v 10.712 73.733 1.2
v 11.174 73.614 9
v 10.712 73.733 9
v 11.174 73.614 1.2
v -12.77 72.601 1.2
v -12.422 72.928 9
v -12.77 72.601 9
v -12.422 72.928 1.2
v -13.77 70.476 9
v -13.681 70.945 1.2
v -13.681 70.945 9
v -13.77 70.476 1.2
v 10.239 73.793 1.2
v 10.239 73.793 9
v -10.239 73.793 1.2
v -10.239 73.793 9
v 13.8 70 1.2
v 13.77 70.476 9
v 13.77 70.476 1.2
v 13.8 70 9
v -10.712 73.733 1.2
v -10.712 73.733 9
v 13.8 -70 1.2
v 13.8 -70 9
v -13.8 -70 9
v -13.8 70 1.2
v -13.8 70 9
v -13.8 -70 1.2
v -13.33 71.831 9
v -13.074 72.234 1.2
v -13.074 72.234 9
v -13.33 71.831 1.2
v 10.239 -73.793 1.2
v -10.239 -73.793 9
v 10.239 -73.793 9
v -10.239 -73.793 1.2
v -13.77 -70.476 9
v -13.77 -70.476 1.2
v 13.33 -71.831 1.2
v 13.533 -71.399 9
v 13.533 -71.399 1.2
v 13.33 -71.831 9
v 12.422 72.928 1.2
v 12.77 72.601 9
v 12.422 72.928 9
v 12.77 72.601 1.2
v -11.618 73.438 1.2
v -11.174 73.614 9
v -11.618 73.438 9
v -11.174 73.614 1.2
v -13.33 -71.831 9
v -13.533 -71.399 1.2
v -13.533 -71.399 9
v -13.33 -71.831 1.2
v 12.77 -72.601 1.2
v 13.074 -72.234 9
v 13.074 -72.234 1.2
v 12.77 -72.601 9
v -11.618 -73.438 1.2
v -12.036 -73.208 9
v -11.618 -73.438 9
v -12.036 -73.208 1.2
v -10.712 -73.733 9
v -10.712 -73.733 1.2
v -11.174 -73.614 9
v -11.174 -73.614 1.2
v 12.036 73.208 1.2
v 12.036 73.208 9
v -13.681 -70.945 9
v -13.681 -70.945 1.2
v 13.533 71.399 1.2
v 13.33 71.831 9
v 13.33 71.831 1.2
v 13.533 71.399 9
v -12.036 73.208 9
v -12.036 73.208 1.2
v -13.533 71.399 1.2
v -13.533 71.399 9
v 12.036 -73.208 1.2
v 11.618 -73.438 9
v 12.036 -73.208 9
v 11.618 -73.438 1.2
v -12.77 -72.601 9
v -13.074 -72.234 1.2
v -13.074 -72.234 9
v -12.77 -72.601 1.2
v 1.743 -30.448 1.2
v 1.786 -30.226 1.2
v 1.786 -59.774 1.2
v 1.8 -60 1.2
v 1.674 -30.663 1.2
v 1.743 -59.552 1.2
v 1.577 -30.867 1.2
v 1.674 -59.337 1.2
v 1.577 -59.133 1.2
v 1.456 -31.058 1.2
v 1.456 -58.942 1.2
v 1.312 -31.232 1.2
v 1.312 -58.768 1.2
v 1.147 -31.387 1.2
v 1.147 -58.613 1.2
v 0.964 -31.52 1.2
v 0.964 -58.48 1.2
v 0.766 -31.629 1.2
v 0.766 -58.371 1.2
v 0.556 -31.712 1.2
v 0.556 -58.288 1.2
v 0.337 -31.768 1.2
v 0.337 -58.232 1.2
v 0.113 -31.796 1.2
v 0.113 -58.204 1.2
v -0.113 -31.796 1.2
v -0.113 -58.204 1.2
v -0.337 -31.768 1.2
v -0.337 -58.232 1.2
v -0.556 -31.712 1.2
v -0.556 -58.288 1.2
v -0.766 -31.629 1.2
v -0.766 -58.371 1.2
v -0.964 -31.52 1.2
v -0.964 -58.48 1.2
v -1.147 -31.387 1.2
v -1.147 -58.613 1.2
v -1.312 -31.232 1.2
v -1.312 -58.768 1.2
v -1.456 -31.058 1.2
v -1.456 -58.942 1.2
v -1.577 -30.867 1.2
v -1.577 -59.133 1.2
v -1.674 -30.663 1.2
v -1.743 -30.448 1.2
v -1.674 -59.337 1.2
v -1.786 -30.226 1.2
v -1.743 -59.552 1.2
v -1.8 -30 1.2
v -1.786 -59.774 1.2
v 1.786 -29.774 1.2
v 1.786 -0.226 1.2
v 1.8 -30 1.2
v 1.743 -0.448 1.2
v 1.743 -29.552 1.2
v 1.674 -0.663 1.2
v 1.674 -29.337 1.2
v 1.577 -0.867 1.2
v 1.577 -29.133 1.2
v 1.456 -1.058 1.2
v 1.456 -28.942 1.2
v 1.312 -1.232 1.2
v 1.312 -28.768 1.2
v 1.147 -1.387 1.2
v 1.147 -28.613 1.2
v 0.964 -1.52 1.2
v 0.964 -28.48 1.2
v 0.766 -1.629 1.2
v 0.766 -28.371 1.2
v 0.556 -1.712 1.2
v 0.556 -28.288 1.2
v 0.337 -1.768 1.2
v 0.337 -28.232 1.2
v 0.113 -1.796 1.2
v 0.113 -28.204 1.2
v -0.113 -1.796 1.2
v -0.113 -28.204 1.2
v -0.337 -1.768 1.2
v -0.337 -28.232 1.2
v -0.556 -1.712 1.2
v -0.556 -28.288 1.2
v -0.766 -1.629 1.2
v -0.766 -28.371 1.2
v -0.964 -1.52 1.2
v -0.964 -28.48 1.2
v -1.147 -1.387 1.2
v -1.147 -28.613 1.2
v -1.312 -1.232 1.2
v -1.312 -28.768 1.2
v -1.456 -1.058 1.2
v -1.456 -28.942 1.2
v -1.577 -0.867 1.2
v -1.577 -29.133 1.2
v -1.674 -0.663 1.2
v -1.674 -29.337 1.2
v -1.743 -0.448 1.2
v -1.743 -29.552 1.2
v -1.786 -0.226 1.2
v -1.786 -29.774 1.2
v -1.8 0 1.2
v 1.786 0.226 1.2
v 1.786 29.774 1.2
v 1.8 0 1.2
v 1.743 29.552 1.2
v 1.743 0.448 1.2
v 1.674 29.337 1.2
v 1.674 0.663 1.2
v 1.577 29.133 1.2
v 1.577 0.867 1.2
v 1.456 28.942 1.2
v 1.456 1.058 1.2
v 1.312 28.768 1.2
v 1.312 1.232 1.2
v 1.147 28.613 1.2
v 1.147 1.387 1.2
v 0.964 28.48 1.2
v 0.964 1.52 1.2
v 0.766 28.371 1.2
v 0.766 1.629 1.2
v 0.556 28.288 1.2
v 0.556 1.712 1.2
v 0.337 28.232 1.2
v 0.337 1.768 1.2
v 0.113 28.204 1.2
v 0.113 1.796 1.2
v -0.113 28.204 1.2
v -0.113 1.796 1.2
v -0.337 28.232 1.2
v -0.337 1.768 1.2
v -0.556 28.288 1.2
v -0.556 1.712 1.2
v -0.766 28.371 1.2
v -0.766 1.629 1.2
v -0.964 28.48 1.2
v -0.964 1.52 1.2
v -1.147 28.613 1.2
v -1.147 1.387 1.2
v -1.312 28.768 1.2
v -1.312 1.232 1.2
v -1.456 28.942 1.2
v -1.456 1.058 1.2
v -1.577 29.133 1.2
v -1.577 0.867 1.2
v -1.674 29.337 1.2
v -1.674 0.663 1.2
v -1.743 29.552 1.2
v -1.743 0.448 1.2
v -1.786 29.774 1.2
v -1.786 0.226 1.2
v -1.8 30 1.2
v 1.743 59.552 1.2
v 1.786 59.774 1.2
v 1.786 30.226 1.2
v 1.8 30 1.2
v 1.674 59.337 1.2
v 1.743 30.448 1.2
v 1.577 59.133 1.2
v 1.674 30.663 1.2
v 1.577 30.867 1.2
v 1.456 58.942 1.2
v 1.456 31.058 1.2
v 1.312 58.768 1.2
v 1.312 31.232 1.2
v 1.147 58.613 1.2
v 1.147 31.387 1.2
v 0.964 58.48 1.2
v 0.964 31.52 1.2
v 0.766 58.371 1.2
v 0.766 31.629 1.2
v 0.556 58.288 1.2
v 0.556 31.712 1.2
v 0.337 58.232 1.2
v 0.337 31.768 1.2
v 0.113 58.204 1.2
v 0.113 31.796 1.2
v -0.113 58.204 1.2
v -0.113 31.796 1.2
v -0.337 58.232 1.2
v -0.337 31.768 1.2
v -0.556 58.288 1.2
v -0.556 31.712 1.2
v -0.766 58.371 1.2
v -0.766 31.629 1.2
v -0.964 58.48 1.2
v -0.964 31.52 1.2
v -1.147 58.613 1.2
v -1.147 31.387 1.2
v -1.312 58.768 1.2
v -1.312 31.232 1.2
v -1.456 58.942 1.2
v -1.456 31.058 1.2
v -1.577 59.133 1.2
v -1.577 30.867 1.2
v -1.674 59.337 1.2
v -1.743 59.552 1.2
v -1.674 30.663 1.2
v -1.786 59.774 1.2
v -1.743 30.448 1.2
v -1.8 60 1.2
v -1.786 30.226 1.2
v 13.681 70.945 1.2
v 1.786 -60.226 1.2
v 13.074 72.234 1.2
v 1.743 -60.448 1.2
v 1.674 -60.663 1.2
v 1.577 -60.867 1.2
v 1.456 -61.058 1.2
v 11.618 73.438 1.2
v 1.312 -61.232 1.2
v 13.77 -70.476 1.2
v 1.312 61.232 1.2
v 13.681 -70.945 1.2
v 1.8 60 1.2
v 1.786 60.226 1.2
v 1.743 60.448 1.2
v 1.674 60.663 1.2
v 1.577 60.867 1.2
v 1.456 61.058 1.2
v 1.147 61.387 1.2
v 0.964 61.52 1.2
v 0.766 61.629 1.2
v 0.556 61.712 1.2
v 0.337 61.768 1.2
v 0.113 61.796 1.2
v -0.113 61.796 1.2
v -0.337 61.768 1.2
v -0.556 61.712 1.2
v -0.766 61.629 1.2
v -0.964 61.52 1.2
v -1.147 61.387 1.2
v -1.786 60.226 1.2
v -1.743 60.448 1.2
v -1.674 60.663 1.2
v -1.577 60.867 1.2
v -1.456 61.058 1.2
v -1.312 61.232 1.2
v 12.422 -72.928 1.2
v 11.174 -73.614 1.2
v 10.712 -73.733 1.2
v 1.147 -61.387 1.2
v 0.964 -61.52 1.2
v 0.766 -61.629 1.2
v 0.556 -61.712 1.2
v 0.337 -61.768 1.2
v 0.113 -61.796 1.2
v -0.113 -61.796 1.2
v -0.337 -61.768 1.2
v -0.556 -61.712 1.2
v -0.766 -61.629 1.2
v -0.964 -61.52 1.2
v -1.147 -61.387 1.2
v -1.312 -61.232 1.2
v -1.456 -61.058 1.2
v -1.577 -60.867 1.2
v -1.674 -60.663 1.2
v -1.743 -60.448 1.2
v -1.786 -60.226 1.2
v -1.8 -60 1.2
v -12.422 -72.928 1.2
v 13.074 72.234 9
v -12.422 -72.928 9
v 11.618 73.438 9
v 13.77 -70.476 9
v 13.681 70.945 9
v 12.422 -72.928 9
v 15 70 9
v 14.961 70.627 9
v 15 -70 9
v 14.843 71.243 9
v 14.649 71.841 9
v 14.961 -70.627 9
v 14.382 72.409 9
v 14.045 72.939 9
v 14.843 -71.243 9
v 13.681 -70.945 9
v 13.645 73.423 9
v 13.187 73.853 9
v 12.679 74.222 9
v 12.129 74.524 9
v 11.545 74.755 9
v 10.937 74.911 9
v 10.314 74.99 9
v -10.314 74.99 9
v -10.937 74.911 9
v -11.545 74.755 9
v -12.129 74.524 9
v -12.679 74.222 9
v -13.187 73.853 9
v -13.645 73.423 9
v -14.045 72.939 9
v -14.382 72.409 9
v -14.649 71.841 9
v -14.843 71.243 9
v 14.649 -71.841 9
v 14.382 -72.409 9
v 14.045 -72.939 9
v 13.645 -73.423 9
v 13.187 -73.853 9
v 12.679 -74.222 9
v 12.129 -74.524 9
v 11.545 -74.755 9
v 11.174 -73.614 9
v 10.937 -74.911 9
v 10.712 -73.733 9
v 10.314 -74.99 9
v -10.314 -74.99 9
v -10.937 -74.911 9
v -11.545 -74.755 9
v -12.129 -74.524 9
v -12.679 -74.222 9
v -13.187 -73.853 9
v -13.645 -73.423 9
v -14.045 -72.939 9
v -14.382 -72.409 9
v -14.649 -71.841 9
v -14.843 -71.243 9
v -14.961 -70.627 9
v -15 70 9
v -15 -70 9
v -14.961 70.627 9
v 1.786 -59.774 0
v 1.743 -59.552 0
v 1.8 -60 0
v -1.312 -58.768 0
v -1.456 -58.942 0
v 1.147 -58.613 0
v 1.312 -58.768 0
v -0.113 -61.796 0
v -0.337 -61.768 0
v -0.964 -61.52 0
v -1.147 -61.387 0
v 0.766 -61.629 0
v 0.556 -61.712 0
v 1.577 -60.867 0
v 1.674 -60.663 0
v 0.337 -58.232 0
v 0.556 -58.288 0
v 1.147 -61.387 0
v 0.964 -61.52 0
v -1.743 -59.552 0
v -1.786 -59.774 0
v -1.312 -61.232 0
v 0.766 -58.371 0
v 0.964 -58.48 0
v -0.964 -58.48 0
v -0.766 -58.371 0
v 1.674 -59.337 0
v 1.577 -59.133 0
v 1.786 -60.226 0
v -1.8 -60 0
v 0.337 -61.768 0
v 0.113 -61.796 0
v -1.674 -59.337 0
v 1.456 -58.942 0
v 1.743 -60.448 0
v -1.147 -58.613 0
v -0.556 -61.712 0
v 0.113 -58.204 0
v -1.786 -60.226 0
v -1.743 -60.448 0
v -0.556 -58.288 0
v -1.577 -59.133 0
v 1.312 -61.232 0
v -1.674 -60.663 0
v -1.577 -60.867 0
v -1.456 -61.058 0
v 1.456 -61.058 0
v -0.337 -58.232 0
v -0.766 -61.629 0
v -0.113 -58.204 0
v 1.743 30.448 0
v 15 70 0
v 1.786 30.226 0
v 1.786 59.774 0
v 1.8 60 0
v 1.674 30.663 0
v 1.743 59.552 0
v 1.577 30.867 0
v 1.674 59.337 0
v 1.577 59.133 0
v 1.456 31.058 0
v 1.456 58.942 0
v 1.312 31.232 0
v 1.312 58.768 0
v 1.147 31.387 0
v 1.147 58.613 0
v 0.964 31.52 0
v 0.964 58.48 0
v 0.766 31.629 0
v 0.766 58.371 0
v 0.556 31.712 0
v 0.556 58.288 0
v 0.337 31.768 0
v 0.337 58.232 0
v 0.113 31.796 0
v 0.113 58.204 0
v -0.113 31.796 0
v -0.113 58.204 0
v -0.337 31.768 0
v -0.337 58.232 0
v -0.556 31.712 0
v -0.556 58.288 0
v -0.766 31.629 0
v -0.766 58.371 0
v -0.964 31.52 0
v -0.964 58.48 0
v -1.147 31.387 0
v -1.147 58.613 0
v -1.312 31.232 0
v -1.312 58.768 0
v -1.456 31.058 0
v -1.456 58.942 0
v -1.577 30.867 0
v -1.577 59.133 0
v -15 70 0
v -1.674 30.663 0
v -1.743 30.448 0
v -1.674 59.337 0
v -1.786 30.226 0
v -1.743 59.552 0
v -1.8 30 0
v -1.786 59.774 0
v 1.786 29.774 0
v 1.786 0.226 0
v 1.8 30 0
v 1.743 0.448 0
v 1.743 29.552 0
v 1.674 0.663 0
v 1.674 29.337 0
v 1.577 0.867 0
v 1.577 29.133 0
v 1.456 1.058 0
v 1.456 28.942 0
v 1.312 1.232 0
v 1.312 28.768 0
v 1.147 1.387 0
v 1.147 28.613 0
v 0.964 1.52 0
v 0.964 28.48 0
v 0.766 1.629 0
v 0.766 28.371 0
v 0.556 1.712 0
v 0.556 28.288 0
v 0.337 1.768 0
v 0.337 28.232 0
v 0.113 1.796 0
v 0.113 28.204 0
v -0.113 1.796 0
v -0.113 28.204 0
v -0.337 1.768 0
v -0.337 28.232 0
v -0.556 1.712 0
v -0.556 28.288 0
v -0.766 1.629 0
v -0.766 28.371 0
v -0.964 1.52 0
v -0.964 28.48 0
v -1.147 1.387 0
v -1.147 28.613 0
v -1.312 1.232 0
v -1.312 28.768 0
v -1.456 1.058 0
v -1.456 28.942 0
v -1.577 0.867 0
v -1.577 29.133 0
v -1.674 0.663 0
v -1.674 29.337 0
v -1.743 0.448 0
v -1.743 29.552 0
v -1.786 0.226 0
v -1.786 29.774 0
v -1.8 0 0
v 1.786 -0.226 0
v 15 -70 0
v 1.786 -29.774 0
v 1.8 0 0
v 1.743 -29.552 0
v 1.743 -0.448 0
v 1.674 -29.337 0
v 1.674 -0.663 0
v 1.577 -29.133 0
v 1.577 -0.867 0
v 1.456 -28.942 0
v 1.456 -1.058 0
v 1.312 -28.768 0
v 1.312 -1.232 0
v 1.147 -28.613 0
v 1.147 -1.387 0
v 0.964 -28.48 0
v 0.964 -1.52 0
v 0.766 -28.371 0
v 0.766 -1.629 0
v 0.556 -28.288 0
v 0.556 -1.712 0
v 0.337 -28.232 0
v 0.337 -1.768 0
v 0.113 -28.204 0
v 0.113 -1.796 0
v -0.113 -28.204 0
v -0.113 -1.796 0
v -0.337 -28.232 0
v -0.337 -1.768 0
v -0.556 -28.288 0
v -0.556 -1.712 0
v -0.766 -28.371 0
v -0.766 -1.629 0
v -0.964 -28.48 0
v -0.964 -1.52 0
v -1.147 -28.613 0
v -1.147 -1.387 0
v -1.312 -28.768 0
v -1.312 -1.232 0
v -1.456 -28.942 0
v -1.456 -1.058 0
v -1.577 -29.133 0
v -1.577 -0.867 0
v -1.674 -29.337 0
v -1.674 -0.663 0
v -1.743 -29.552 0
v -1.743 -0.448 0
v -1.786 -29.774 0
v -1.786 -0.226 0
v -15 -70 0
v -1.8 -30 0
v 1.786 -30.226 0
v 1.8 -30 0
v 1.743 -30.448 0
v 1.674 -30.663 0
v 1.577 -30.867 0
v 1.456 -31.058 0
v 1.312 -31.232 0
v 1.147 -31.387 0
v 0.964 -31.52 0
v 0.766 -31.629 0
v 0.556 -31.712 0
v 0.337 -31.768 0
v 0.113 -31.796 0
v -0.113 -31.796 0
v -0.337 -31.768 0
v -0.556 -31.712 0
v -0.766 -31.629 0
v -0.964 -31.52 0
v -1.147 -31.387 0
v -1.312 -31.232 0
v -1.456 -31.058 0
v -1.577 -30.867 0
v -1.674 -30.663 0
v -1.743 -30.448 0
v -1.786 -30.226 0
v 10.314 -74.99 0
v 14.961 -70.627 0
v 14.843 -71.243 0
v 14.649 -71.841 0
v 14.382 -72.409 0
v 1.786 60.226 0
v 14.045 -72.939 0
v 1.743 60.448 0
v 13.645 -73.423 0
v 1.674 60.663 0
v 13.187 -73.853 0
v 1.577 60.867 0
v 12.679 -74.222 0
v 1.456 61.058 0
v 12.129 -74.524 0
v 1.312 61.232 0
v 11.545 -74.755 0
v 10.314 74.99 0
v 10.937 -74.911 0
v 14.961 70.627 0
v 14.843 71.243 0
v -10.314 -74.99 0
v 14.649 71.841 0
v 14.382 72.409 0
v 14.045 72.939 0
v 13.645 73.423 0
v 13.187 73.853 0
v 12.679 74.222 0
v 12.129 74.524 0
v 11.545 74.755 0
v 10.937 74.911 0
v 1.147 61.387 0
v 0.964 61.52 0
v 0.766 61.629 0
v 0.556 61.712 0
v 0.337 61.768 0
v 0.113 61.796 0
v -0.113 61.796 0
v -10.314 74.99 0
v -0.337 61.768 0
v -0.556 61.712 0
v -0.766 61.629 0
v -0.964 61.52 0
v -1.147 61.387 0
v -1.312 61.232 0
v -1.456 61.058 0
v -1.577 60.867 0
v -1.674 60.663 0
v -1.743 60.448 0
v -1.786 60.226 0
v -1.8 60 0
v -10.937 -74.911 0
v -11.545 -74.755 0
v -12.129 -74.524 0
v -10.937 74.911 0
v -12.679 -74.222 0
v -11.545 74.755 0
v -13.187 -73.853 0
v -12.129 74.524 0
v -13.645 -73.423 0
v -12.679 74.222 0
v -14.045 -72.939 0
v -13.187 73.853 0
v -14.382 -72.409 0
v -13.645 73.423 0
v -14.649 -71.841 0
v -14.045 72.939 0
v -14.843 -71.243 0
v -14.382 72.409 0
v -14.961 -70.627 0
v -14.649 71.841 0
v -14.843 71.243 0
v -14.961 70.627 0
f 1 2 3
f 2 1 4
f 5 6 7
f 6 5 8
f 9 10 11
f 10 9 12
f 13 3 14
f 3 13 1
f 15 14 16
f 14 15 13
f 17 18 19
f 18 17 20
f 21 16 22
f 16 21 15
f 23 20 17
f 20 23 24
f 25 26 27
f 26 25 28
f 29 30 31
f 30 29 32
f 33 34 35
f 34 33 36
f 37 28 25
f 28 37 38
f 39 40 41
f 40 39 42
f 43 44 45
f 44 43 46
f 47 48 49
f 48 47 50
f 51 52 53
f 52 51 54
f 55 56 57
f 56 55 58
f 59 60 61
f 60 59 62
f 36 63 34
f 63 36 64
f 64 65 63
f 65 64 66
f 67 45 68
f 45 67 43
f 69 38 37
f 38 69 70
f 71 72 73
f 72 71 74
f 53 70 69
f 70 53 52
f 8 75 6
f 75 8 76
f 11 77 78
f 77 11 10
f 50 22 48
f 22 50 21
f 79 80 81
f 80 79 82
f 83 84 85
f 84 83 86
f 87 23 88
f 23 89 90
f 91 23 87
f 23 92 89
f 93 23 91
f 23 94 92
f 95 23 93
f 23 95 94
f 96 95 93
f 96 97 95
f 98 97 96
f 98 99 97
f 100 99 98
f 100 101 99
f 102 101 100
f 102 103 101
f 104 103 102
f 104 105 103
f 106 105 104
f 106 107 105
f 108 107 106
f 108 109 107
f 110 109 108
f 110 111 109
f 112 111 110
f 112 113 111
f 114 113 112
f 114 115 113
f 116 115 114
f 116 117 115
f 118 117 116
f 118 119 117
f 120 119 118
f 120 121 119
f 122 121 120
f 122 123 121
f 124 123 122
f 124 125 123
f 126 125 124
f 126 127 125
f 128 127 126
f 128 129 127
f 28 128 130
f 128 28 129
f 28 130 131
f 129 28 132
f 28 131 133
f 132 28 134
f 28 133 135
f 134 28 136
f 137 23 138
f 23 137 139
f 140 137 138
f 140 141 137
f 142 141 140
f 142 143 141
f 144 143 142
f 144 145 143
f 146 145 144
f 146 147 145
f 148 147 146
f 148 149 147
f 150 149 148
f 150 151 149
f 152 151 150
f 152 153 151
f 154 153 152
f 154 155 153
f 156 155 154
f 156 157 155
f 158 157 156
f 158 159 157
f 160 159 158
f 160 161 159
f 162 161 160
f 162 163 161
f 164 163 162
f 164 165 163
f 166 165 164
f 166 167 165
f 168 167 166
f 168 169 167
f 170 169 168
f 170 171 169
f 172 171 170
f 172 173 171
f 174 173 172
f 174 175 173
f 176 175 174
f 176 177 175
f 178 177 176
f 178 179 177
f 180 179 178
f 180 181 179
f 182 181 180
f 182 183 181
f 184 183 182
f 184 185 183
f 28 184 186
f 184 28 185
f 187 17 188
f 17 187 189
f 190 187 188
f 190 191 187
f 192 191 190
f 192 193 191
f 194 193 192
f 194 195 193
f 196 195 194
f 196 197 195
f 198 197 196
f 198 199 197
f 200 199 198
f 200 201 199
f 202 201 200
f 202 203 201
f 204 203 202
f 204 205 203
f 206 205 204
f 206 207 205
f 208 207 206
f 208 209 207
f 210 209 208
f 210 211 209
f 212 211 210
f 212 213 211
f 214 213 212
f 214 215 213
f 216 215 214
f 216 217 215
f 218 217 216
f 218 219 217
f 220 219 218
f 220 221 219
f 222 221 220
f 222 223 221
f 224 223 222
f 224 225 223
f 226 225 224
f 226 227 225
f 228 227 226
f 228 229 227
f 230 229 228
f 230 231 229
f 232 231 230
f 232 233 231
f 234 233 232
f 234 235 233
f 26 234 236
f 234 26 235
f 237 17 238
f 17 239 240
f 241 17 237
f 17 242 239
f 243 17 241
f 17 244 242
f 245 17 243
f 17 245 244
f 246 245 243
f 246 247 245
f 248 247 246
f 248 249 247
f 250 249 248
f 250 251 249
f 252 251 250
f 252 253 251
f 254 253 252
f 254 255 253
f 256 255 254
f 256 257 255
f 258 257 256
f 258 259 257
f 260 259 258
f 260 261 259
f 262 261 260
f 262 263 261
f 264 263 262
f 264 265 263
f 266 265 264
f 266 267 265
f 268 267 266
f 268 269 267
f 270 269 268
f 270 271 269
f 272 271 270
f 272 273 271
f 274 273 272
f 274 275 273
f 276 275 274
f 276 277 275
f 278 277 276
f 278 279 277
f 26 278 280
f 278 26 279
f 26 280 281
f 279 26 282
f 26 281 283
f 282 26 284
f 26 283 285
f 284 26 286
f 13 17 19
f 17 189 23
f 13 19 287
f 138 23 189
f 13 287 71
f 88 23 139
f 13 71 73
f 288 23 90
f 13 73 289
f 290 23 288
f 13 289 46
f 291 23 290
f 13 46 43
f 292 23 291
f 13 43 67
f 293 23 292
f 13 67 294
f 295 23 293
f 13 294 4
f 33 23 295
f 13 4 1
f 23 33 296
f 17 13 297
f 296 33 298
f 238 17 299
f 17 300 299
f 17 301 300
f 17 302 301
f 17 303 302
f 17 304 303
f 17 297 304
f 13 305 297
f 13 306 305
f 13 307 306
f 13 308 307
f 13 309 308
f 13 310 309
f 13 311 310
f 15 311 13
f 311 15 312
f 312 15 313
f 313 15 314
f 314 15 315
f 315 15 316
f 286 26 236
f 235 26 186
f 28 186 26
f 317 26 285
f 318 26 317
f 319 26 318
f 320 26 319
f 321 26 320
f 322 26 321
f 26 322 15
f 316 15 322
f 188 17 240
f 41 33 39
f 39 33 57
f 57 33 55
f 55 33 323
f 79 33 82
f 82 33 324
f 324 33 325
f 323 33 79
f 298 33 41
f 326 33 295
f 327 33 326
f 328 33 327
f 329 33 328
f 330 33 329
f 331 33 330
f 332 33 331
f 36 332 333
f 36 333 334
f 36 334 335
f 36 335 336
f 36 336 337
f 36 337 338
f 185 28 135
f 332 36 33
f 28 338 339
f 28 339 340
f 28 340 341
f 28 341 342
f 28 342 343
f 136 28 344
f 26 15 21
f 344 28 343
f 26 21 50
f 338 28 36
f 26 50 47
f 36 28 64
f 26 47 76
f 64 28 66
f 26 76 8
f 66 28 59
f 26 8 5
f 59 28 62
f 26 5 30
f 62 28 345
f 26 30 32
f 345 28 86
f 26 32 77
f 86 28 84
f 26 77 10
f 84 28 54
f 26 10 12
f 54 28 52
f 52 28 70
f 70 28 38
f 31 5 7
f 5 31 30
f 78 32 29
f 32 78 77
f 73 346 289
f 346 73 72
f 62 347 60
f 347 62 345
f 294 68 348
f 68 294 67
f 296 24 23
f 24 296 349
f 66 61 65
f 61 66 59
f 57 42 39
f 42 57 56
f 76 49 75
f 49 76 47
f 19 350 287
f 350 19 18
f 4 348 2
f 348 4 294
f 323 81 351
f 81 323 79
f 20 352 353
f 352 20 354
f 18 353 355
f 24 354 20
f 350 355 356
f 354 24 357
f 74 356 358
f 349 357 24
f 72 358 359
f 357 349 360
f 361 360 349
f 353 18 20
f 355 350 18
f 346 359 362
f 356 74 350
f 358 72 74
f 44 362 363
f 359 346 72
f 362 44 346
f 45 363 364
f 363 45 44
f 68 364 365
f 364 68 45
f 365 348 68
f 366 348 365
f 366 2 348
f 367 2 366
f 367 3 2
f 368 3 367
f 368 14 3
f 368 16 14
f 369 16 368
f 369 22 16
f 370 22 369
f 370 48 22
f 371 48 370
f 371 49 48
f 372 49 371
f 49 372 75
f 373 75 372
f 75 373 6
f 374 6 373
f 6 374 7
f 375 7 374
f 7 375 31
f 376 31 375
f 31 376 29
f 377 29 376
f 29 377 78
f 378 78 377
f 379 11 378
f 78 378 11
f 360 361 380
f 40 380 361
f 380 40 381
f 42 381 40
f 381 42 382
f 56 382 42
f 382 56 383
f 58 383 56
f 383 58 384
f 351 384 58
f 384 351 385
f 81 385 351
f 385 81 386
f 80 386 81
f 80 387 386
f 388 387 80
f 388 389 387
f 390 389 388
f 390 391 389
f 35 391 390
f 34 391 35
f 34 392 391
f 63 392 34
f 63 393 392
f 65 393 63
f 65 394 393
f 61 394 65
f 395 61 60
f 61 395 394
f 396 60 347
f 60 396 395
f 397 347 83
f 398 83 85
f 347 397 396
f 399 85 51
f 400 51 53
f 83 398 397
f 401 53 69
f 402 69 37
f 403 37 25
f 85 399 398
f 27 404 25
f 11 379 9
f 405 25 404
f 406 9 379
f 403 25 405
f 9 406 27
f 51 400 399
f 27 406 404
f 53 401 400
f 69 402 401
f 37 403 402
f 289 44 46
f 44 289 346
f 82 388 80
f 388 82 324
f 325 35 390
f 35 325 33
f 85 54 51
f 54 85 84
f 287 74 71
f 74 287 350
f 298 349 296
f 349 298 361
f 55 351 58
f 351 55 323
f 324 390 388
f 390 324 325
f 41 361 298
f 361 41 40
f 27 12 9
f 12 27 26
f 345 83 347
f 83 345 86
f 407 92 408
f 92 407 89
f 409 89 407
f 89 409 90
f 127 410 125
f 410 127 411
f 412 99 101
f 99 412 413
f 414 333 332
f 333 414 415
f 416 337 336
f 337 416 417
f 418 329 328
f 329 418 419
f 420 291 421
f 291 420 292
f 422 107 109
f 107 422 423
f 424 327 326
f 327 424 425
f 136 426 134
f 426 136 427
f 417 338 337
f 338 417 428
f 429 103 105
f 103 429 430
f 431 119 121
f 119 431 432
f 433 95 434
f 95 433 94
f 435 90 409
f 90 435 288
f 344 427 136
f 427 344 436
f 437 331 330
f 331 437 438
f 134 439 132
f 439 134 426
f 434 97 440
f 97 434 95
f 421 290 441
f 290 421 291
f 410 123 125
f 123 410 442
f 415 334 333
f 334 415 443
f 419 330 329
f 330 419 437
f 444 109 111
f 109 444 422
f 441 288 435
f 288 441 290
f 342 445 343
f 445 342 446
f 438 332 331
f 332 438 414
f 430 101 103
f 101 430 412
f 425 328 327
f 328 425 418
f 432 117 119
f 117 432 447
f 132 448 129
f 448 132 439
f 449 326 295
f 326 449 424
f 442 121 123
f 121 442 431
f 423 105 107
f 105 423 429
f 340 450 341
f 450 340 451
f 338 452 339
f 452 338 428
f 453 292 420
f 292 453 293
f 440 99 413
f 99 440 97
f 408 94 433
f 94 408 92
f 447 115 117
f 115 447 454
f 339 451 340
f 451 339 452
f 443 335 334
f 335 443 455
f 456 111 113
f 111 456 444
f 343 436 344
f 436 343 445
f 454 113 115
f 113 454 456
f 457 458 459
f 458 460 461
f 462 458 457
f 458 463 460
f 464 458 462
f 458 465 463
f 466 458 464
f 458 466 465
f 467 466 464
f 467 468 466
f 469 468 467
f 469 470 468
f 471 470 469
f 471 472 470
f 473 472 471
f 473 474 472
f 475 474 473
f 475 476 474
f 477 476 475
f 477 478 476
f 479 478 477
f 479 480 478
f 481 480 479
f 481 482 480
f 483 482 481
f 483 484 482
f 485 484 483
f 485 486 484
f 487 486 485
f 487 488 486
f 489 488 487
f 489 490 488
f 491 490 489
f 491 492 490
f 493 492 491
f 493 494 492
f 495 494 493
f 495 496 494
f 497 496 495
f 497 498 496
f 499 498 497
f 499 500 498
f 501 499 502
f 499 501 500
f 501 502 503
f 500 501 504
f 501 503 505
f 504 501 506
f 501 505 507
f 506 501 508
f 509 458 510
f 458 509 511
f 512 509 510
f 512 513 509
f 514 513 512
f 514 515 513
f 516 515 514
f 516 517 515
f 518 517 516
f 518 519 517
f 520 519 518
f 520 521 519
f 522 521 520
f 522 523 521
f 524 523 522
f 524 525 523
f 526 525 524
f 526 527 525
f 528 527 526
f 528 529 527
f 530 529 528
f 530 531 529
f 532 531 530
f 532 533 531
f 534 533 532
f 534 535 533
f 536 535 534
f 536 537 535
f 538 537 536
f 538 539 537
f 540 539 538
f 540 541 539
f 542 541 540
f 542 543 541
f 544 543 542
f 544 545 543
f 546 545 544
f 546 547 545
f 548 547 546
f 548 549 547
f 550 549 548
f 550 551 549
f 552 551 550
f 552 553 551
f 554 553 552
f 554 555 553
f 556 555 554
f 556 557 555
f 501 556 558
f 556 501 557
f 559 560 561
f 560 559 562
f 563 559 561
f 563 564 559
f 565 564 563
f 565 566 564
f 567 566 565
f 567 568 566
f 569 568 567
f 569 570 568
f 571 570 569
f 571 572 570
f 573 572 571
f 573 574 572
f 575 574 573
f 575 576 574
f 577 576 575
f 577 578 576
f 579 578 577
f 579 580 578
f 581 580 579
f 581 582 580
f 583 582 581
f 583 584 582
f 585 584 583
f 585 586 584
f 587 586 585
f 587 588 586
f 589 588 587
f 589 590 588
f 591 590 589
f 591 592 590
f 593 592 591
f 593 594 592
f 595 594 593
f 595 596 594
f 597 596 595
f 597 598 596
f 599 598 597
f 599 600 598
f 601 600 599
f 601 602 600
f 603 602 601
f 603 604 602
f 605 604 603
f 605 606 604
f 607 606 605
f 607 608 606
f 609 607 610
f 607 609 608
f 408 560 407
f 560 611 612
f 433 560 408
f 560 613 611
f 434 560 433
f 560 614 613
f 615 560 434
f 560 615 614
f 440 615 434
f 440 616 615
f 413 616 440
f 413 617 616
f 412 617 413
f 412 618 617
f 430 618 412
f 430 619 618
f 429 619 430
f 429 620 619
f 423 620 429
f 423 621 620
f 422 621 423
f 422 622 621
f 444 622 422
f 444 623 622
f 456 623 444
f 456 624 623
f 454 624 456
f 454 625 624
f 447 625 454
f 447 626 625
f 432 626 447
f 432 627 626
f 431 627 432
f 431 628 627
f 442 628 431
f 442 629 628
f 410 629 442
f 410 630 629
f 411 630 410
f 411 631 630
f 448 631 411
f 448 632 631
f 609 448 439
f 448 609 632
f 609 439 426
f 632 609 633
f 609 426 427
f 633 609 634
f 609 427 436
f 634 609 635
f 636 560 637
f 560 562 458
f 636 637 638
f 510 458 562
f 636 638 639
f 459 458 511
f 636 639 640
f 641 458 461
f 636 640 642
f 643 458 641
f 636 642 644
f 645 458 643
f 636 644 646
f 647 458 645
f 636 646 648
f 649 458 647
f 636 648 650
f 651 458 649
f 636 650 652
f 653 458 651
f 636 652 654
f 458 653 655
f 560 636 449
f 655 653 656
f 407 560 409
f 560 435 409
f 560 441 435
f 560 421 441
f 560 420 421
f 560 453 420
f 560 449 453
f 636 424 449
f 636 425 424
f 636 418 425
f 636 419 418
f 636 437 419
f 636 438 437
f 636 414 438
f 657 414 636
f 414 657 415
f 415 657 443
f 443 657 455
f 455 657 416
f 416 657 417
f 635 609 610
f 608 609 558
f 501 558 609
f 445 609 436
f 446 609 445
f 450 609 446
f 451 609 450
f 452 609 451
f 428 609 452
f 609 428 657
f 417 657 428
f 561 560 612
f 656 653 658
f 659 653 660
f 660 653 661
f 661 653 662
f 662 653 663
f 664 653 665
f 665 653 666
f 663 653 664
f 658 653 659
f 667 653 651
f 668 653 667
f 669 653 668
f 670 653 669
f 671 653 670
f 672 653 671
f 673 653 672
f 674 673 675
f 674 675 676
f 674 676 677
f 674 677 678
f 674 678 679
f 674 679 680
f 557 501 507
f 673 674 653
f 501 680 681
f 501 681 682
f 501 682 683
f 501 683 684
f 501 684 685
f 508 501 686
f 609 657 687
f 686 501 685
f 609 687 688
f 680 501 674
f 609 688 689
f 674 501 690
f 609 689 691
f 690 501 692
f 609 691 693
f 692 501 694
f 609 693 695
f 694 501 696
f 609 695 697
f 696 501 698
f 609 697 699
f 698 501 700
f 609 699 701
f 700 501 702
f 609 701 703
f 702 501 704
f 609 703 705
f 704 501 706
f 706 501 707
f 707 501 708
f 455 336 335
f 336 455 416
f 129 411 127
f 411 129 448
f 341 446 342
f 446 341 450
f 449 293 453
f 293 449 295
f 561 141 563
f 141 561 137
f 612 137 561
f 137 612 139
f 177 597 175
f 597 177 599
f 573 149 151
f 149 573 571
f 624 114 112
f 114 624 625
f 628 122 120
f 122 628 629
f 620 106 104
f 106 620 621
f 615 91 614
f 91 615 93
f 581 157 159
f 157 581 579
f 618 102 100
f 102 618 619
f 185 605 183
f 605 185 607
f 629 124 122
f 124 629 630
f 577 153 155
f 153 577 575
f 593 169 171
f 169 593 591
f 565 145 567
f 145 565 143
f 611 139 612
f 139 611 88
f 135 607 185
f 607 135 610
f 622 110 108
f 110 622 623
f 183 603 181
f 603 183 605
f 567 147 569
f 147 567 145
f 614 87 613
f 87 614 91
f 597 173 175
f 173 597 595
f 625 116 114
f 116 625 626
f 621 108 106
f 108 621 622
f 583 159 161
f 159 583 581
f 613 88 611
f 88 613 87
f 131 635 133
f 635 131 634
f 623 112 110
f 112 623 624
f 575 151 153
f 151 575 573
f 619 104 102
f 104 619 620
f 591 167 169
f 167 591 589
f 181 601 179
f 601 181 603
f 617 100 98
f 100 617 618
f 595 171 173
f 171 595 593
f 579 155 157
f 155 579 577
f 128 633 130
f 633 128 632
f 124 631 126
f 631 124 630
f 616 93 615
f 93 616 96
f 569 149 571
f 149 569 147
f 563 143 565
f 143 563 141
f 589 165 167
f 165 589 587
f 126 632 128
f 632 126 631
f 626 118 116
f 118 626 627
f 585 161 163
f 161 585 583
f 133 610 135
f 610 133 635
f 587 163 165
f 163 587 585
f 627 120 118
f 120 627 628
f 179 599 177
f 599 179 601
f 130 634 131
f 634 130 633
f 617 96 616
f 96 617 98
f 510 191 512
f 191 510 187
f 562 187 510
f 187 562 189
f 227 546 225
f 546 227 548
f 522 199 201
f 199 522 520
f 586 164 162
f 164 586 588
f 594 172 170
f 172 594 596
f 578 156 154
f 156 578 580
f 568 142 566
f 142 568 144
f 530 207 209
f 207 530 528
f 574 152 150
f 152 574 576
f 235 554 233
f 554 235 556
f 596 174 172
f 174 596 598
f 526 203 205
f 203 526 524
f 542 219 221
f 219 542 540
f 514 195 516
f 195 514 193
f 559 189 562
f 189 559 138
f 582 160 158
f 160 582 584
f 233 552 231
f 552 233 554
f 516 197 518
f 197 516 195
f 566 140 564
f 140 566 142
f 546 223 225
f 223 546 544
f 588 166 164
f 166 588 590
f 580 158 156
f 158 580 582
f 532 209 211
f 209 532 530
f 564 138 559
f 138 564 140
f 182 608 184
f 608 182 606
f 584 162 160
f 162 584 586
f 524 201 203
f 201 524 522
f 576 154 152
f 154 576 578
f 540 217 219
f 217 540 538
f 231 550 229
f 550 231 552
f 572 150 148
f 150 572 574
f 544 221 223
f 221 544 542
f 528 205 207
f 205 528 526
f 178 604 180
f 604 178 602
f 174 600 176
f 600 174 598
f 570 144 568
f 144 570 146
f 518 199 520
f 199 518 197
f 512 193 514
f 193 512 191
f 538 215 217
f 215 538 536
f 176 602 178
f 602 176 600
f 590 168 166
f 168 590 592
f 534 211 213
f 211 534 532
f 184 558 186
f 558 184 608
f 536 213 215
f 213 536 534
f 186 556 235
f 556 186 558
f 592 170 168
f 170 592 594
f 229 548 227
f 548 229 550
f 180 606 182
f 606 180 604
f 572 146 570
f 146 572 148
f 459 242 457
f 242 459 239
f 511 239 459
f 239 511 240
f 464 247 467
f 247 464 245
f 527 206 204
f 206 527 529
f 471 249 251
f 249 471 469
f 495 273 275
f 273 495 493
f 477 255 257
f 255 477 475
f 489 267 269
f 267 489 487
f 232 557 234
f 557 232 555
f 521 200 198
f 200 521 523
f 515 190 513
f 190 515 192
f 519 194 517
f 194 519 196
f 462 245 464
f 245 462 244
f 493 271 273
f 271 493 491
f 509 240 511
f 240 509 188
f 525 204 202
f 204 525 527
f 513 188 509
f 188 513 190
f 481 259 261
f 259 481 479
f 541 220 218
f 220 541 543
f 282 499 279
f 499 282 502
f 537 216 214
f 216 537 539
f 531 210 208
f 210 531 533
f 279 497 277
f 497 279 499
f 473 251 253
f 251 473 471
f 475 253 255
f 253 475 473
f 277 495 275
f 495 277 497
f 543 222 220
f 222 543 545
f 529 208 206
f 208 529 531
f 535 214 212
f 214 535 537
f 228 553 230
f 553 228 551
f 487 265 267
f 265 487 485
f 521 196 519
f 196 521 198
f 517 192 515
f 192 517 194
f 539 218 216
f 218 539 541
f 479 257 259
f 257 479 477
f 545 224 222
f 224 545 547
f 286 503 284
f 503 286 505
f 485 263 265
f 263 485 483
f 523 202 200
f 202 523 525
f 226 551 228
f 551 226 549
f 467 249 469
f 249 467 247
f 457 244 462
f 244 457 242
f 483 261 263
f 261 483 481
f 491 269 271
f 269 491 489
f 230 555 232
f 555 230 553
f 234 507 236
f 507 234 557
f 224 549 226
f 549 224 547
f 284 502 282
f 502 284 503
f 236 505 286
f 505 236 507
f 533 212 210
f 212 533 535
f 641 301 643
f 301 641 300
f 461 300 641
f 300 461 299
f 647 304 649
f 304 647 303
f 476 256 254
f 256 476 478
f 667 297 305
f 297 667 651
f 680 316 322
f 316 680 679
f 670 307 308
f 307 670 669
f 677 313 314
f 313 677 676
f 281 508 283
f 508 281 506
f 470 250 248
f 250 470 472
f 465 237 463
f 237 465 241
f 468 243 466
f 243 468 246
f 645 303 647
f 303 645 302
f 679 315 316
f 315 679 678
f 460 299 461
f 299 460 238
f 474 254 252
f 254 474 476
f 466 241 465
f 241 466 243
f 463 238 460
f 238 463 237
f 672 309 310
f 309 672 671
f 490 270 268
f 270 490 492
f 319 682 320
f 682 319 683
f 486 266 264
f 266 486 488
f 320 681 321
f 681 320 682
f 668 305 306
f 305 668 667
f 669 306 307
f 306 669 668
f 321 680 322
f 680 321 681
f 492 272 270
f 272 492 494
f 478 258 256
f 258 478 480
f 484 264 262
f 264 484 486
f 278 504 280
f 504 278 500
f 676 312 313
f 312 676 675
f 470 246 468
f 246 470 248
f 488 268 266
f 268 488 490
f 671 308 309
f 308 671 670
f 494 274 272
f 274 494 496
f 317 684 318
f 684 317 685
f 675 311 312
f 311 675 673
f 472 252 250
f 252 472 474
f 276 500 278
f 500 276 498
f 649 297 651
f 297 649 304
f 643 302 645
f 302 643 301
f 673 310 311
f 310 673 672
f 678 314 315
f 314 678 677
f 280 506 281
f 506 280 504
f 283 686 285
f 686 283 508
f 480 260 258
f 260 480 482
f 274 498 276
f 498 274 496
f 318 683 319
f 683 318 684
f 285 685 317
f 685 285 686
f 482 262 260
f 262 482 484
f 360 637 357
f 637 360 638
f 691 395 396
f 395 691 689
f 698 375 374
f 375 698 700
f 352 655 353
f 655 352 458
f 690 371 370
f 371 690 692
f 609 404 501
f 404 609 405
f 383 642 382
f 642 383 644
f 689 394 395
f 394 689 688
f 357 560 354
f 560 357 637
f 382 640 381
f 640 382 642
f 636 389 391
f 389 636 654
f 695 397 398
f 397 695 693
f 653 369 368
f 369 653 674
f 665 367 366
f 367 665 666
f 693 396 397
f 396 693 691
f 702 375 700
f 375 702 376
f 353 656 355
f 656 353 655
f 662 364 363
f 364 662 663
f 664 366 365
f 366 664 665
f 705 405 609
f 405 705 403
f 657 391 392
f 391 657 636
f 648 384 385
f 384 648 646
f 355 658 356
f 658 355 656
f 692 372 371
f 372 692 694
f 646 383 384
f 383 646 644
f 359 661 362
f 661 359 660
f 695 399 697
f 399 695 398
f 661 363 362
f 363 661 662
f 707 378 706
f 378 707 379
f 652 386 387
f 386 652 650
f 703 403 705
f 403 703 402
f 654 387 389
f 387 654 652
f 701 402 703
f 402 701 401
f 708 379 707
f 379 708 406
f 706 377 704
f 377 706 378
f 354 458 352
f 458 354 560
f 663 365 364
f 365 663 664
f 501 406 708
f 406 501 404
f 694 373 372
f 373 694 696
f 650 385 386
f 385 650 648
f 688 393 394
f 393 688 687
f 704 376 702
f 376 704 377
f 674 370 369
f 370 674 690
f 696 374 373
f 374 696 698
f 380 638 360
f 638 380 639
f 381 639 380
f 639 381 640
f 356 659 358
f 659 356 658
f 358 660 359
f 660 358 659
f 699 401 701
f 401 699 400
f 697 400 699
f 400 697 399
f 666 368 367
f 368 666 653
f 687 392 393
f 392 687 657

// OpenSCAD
$fn = 50;


difference() {
	union() {
		hull() {
			translate(v = [-10.0000000000, 70.0000000000, 0]) {
				cylinder(h = 9, r = 5);
			}
			translate(v = [10.0000000000, 70.0000000000, 0]) {
				cylinder(h = 9, r = 5);
			}
			translate(v = [-10.0000000000, -70.0000000000, 0]) {
				cylinder(h = 9, r = 5);
			}
			translate(v = [10.0000000000, -70.0000000000, 0]) {
				cylinder(h = 9, r = 5);
			}
		}
	}
	union() {
		translate(v = [0, 0, 1.2000000000]) {
			hull() {
				translate(v = [-10.0000000000, 70.0000000000, 0]) {
					cylinder(h = 7.8000000000, r = 3.8000000000);
				}
				translate(v = [10.0000000000, 70.0000000000, 0]) {
					cylinder(h = 7.8000000000, r = 3.8000000000);
				}
				translate(v = [-10.0000000000, -70.0000000000, 0]) {
					cylinder(h = 7.8000000000, r = 3.8000000000);
				}
				translate(v = [10.0000000000, -70.0000000000, 0]) {
					cylinder(h = 7.8000000000, r = 3.8000000000);
				}
			}
		}
		#translate(v = [0.0000000000, -60.0000000000, 0]) {
			cylinder(h = 1.2000000000, r = 1.8000000000);
		}
		#translate(v = [0.0000000000, -30.0000000000, 0]) {
			cylinder(h = 1.2000000000, r = 1.8000000000);
		}
		#cylinder(h = 1.2000000000, r = 1.8000000000);
		#translate(v = [0.0000000000, 30.0000000000, 0]) {
			cylinder(h = 1.2000000000, r = 1.8000000000);
		}
		#translate(v = [0.0000000000, 60.0000000000, 0]) {
			cylinder(h = 1.2000000000, r = 1.8000000000);
		}
	}
}
